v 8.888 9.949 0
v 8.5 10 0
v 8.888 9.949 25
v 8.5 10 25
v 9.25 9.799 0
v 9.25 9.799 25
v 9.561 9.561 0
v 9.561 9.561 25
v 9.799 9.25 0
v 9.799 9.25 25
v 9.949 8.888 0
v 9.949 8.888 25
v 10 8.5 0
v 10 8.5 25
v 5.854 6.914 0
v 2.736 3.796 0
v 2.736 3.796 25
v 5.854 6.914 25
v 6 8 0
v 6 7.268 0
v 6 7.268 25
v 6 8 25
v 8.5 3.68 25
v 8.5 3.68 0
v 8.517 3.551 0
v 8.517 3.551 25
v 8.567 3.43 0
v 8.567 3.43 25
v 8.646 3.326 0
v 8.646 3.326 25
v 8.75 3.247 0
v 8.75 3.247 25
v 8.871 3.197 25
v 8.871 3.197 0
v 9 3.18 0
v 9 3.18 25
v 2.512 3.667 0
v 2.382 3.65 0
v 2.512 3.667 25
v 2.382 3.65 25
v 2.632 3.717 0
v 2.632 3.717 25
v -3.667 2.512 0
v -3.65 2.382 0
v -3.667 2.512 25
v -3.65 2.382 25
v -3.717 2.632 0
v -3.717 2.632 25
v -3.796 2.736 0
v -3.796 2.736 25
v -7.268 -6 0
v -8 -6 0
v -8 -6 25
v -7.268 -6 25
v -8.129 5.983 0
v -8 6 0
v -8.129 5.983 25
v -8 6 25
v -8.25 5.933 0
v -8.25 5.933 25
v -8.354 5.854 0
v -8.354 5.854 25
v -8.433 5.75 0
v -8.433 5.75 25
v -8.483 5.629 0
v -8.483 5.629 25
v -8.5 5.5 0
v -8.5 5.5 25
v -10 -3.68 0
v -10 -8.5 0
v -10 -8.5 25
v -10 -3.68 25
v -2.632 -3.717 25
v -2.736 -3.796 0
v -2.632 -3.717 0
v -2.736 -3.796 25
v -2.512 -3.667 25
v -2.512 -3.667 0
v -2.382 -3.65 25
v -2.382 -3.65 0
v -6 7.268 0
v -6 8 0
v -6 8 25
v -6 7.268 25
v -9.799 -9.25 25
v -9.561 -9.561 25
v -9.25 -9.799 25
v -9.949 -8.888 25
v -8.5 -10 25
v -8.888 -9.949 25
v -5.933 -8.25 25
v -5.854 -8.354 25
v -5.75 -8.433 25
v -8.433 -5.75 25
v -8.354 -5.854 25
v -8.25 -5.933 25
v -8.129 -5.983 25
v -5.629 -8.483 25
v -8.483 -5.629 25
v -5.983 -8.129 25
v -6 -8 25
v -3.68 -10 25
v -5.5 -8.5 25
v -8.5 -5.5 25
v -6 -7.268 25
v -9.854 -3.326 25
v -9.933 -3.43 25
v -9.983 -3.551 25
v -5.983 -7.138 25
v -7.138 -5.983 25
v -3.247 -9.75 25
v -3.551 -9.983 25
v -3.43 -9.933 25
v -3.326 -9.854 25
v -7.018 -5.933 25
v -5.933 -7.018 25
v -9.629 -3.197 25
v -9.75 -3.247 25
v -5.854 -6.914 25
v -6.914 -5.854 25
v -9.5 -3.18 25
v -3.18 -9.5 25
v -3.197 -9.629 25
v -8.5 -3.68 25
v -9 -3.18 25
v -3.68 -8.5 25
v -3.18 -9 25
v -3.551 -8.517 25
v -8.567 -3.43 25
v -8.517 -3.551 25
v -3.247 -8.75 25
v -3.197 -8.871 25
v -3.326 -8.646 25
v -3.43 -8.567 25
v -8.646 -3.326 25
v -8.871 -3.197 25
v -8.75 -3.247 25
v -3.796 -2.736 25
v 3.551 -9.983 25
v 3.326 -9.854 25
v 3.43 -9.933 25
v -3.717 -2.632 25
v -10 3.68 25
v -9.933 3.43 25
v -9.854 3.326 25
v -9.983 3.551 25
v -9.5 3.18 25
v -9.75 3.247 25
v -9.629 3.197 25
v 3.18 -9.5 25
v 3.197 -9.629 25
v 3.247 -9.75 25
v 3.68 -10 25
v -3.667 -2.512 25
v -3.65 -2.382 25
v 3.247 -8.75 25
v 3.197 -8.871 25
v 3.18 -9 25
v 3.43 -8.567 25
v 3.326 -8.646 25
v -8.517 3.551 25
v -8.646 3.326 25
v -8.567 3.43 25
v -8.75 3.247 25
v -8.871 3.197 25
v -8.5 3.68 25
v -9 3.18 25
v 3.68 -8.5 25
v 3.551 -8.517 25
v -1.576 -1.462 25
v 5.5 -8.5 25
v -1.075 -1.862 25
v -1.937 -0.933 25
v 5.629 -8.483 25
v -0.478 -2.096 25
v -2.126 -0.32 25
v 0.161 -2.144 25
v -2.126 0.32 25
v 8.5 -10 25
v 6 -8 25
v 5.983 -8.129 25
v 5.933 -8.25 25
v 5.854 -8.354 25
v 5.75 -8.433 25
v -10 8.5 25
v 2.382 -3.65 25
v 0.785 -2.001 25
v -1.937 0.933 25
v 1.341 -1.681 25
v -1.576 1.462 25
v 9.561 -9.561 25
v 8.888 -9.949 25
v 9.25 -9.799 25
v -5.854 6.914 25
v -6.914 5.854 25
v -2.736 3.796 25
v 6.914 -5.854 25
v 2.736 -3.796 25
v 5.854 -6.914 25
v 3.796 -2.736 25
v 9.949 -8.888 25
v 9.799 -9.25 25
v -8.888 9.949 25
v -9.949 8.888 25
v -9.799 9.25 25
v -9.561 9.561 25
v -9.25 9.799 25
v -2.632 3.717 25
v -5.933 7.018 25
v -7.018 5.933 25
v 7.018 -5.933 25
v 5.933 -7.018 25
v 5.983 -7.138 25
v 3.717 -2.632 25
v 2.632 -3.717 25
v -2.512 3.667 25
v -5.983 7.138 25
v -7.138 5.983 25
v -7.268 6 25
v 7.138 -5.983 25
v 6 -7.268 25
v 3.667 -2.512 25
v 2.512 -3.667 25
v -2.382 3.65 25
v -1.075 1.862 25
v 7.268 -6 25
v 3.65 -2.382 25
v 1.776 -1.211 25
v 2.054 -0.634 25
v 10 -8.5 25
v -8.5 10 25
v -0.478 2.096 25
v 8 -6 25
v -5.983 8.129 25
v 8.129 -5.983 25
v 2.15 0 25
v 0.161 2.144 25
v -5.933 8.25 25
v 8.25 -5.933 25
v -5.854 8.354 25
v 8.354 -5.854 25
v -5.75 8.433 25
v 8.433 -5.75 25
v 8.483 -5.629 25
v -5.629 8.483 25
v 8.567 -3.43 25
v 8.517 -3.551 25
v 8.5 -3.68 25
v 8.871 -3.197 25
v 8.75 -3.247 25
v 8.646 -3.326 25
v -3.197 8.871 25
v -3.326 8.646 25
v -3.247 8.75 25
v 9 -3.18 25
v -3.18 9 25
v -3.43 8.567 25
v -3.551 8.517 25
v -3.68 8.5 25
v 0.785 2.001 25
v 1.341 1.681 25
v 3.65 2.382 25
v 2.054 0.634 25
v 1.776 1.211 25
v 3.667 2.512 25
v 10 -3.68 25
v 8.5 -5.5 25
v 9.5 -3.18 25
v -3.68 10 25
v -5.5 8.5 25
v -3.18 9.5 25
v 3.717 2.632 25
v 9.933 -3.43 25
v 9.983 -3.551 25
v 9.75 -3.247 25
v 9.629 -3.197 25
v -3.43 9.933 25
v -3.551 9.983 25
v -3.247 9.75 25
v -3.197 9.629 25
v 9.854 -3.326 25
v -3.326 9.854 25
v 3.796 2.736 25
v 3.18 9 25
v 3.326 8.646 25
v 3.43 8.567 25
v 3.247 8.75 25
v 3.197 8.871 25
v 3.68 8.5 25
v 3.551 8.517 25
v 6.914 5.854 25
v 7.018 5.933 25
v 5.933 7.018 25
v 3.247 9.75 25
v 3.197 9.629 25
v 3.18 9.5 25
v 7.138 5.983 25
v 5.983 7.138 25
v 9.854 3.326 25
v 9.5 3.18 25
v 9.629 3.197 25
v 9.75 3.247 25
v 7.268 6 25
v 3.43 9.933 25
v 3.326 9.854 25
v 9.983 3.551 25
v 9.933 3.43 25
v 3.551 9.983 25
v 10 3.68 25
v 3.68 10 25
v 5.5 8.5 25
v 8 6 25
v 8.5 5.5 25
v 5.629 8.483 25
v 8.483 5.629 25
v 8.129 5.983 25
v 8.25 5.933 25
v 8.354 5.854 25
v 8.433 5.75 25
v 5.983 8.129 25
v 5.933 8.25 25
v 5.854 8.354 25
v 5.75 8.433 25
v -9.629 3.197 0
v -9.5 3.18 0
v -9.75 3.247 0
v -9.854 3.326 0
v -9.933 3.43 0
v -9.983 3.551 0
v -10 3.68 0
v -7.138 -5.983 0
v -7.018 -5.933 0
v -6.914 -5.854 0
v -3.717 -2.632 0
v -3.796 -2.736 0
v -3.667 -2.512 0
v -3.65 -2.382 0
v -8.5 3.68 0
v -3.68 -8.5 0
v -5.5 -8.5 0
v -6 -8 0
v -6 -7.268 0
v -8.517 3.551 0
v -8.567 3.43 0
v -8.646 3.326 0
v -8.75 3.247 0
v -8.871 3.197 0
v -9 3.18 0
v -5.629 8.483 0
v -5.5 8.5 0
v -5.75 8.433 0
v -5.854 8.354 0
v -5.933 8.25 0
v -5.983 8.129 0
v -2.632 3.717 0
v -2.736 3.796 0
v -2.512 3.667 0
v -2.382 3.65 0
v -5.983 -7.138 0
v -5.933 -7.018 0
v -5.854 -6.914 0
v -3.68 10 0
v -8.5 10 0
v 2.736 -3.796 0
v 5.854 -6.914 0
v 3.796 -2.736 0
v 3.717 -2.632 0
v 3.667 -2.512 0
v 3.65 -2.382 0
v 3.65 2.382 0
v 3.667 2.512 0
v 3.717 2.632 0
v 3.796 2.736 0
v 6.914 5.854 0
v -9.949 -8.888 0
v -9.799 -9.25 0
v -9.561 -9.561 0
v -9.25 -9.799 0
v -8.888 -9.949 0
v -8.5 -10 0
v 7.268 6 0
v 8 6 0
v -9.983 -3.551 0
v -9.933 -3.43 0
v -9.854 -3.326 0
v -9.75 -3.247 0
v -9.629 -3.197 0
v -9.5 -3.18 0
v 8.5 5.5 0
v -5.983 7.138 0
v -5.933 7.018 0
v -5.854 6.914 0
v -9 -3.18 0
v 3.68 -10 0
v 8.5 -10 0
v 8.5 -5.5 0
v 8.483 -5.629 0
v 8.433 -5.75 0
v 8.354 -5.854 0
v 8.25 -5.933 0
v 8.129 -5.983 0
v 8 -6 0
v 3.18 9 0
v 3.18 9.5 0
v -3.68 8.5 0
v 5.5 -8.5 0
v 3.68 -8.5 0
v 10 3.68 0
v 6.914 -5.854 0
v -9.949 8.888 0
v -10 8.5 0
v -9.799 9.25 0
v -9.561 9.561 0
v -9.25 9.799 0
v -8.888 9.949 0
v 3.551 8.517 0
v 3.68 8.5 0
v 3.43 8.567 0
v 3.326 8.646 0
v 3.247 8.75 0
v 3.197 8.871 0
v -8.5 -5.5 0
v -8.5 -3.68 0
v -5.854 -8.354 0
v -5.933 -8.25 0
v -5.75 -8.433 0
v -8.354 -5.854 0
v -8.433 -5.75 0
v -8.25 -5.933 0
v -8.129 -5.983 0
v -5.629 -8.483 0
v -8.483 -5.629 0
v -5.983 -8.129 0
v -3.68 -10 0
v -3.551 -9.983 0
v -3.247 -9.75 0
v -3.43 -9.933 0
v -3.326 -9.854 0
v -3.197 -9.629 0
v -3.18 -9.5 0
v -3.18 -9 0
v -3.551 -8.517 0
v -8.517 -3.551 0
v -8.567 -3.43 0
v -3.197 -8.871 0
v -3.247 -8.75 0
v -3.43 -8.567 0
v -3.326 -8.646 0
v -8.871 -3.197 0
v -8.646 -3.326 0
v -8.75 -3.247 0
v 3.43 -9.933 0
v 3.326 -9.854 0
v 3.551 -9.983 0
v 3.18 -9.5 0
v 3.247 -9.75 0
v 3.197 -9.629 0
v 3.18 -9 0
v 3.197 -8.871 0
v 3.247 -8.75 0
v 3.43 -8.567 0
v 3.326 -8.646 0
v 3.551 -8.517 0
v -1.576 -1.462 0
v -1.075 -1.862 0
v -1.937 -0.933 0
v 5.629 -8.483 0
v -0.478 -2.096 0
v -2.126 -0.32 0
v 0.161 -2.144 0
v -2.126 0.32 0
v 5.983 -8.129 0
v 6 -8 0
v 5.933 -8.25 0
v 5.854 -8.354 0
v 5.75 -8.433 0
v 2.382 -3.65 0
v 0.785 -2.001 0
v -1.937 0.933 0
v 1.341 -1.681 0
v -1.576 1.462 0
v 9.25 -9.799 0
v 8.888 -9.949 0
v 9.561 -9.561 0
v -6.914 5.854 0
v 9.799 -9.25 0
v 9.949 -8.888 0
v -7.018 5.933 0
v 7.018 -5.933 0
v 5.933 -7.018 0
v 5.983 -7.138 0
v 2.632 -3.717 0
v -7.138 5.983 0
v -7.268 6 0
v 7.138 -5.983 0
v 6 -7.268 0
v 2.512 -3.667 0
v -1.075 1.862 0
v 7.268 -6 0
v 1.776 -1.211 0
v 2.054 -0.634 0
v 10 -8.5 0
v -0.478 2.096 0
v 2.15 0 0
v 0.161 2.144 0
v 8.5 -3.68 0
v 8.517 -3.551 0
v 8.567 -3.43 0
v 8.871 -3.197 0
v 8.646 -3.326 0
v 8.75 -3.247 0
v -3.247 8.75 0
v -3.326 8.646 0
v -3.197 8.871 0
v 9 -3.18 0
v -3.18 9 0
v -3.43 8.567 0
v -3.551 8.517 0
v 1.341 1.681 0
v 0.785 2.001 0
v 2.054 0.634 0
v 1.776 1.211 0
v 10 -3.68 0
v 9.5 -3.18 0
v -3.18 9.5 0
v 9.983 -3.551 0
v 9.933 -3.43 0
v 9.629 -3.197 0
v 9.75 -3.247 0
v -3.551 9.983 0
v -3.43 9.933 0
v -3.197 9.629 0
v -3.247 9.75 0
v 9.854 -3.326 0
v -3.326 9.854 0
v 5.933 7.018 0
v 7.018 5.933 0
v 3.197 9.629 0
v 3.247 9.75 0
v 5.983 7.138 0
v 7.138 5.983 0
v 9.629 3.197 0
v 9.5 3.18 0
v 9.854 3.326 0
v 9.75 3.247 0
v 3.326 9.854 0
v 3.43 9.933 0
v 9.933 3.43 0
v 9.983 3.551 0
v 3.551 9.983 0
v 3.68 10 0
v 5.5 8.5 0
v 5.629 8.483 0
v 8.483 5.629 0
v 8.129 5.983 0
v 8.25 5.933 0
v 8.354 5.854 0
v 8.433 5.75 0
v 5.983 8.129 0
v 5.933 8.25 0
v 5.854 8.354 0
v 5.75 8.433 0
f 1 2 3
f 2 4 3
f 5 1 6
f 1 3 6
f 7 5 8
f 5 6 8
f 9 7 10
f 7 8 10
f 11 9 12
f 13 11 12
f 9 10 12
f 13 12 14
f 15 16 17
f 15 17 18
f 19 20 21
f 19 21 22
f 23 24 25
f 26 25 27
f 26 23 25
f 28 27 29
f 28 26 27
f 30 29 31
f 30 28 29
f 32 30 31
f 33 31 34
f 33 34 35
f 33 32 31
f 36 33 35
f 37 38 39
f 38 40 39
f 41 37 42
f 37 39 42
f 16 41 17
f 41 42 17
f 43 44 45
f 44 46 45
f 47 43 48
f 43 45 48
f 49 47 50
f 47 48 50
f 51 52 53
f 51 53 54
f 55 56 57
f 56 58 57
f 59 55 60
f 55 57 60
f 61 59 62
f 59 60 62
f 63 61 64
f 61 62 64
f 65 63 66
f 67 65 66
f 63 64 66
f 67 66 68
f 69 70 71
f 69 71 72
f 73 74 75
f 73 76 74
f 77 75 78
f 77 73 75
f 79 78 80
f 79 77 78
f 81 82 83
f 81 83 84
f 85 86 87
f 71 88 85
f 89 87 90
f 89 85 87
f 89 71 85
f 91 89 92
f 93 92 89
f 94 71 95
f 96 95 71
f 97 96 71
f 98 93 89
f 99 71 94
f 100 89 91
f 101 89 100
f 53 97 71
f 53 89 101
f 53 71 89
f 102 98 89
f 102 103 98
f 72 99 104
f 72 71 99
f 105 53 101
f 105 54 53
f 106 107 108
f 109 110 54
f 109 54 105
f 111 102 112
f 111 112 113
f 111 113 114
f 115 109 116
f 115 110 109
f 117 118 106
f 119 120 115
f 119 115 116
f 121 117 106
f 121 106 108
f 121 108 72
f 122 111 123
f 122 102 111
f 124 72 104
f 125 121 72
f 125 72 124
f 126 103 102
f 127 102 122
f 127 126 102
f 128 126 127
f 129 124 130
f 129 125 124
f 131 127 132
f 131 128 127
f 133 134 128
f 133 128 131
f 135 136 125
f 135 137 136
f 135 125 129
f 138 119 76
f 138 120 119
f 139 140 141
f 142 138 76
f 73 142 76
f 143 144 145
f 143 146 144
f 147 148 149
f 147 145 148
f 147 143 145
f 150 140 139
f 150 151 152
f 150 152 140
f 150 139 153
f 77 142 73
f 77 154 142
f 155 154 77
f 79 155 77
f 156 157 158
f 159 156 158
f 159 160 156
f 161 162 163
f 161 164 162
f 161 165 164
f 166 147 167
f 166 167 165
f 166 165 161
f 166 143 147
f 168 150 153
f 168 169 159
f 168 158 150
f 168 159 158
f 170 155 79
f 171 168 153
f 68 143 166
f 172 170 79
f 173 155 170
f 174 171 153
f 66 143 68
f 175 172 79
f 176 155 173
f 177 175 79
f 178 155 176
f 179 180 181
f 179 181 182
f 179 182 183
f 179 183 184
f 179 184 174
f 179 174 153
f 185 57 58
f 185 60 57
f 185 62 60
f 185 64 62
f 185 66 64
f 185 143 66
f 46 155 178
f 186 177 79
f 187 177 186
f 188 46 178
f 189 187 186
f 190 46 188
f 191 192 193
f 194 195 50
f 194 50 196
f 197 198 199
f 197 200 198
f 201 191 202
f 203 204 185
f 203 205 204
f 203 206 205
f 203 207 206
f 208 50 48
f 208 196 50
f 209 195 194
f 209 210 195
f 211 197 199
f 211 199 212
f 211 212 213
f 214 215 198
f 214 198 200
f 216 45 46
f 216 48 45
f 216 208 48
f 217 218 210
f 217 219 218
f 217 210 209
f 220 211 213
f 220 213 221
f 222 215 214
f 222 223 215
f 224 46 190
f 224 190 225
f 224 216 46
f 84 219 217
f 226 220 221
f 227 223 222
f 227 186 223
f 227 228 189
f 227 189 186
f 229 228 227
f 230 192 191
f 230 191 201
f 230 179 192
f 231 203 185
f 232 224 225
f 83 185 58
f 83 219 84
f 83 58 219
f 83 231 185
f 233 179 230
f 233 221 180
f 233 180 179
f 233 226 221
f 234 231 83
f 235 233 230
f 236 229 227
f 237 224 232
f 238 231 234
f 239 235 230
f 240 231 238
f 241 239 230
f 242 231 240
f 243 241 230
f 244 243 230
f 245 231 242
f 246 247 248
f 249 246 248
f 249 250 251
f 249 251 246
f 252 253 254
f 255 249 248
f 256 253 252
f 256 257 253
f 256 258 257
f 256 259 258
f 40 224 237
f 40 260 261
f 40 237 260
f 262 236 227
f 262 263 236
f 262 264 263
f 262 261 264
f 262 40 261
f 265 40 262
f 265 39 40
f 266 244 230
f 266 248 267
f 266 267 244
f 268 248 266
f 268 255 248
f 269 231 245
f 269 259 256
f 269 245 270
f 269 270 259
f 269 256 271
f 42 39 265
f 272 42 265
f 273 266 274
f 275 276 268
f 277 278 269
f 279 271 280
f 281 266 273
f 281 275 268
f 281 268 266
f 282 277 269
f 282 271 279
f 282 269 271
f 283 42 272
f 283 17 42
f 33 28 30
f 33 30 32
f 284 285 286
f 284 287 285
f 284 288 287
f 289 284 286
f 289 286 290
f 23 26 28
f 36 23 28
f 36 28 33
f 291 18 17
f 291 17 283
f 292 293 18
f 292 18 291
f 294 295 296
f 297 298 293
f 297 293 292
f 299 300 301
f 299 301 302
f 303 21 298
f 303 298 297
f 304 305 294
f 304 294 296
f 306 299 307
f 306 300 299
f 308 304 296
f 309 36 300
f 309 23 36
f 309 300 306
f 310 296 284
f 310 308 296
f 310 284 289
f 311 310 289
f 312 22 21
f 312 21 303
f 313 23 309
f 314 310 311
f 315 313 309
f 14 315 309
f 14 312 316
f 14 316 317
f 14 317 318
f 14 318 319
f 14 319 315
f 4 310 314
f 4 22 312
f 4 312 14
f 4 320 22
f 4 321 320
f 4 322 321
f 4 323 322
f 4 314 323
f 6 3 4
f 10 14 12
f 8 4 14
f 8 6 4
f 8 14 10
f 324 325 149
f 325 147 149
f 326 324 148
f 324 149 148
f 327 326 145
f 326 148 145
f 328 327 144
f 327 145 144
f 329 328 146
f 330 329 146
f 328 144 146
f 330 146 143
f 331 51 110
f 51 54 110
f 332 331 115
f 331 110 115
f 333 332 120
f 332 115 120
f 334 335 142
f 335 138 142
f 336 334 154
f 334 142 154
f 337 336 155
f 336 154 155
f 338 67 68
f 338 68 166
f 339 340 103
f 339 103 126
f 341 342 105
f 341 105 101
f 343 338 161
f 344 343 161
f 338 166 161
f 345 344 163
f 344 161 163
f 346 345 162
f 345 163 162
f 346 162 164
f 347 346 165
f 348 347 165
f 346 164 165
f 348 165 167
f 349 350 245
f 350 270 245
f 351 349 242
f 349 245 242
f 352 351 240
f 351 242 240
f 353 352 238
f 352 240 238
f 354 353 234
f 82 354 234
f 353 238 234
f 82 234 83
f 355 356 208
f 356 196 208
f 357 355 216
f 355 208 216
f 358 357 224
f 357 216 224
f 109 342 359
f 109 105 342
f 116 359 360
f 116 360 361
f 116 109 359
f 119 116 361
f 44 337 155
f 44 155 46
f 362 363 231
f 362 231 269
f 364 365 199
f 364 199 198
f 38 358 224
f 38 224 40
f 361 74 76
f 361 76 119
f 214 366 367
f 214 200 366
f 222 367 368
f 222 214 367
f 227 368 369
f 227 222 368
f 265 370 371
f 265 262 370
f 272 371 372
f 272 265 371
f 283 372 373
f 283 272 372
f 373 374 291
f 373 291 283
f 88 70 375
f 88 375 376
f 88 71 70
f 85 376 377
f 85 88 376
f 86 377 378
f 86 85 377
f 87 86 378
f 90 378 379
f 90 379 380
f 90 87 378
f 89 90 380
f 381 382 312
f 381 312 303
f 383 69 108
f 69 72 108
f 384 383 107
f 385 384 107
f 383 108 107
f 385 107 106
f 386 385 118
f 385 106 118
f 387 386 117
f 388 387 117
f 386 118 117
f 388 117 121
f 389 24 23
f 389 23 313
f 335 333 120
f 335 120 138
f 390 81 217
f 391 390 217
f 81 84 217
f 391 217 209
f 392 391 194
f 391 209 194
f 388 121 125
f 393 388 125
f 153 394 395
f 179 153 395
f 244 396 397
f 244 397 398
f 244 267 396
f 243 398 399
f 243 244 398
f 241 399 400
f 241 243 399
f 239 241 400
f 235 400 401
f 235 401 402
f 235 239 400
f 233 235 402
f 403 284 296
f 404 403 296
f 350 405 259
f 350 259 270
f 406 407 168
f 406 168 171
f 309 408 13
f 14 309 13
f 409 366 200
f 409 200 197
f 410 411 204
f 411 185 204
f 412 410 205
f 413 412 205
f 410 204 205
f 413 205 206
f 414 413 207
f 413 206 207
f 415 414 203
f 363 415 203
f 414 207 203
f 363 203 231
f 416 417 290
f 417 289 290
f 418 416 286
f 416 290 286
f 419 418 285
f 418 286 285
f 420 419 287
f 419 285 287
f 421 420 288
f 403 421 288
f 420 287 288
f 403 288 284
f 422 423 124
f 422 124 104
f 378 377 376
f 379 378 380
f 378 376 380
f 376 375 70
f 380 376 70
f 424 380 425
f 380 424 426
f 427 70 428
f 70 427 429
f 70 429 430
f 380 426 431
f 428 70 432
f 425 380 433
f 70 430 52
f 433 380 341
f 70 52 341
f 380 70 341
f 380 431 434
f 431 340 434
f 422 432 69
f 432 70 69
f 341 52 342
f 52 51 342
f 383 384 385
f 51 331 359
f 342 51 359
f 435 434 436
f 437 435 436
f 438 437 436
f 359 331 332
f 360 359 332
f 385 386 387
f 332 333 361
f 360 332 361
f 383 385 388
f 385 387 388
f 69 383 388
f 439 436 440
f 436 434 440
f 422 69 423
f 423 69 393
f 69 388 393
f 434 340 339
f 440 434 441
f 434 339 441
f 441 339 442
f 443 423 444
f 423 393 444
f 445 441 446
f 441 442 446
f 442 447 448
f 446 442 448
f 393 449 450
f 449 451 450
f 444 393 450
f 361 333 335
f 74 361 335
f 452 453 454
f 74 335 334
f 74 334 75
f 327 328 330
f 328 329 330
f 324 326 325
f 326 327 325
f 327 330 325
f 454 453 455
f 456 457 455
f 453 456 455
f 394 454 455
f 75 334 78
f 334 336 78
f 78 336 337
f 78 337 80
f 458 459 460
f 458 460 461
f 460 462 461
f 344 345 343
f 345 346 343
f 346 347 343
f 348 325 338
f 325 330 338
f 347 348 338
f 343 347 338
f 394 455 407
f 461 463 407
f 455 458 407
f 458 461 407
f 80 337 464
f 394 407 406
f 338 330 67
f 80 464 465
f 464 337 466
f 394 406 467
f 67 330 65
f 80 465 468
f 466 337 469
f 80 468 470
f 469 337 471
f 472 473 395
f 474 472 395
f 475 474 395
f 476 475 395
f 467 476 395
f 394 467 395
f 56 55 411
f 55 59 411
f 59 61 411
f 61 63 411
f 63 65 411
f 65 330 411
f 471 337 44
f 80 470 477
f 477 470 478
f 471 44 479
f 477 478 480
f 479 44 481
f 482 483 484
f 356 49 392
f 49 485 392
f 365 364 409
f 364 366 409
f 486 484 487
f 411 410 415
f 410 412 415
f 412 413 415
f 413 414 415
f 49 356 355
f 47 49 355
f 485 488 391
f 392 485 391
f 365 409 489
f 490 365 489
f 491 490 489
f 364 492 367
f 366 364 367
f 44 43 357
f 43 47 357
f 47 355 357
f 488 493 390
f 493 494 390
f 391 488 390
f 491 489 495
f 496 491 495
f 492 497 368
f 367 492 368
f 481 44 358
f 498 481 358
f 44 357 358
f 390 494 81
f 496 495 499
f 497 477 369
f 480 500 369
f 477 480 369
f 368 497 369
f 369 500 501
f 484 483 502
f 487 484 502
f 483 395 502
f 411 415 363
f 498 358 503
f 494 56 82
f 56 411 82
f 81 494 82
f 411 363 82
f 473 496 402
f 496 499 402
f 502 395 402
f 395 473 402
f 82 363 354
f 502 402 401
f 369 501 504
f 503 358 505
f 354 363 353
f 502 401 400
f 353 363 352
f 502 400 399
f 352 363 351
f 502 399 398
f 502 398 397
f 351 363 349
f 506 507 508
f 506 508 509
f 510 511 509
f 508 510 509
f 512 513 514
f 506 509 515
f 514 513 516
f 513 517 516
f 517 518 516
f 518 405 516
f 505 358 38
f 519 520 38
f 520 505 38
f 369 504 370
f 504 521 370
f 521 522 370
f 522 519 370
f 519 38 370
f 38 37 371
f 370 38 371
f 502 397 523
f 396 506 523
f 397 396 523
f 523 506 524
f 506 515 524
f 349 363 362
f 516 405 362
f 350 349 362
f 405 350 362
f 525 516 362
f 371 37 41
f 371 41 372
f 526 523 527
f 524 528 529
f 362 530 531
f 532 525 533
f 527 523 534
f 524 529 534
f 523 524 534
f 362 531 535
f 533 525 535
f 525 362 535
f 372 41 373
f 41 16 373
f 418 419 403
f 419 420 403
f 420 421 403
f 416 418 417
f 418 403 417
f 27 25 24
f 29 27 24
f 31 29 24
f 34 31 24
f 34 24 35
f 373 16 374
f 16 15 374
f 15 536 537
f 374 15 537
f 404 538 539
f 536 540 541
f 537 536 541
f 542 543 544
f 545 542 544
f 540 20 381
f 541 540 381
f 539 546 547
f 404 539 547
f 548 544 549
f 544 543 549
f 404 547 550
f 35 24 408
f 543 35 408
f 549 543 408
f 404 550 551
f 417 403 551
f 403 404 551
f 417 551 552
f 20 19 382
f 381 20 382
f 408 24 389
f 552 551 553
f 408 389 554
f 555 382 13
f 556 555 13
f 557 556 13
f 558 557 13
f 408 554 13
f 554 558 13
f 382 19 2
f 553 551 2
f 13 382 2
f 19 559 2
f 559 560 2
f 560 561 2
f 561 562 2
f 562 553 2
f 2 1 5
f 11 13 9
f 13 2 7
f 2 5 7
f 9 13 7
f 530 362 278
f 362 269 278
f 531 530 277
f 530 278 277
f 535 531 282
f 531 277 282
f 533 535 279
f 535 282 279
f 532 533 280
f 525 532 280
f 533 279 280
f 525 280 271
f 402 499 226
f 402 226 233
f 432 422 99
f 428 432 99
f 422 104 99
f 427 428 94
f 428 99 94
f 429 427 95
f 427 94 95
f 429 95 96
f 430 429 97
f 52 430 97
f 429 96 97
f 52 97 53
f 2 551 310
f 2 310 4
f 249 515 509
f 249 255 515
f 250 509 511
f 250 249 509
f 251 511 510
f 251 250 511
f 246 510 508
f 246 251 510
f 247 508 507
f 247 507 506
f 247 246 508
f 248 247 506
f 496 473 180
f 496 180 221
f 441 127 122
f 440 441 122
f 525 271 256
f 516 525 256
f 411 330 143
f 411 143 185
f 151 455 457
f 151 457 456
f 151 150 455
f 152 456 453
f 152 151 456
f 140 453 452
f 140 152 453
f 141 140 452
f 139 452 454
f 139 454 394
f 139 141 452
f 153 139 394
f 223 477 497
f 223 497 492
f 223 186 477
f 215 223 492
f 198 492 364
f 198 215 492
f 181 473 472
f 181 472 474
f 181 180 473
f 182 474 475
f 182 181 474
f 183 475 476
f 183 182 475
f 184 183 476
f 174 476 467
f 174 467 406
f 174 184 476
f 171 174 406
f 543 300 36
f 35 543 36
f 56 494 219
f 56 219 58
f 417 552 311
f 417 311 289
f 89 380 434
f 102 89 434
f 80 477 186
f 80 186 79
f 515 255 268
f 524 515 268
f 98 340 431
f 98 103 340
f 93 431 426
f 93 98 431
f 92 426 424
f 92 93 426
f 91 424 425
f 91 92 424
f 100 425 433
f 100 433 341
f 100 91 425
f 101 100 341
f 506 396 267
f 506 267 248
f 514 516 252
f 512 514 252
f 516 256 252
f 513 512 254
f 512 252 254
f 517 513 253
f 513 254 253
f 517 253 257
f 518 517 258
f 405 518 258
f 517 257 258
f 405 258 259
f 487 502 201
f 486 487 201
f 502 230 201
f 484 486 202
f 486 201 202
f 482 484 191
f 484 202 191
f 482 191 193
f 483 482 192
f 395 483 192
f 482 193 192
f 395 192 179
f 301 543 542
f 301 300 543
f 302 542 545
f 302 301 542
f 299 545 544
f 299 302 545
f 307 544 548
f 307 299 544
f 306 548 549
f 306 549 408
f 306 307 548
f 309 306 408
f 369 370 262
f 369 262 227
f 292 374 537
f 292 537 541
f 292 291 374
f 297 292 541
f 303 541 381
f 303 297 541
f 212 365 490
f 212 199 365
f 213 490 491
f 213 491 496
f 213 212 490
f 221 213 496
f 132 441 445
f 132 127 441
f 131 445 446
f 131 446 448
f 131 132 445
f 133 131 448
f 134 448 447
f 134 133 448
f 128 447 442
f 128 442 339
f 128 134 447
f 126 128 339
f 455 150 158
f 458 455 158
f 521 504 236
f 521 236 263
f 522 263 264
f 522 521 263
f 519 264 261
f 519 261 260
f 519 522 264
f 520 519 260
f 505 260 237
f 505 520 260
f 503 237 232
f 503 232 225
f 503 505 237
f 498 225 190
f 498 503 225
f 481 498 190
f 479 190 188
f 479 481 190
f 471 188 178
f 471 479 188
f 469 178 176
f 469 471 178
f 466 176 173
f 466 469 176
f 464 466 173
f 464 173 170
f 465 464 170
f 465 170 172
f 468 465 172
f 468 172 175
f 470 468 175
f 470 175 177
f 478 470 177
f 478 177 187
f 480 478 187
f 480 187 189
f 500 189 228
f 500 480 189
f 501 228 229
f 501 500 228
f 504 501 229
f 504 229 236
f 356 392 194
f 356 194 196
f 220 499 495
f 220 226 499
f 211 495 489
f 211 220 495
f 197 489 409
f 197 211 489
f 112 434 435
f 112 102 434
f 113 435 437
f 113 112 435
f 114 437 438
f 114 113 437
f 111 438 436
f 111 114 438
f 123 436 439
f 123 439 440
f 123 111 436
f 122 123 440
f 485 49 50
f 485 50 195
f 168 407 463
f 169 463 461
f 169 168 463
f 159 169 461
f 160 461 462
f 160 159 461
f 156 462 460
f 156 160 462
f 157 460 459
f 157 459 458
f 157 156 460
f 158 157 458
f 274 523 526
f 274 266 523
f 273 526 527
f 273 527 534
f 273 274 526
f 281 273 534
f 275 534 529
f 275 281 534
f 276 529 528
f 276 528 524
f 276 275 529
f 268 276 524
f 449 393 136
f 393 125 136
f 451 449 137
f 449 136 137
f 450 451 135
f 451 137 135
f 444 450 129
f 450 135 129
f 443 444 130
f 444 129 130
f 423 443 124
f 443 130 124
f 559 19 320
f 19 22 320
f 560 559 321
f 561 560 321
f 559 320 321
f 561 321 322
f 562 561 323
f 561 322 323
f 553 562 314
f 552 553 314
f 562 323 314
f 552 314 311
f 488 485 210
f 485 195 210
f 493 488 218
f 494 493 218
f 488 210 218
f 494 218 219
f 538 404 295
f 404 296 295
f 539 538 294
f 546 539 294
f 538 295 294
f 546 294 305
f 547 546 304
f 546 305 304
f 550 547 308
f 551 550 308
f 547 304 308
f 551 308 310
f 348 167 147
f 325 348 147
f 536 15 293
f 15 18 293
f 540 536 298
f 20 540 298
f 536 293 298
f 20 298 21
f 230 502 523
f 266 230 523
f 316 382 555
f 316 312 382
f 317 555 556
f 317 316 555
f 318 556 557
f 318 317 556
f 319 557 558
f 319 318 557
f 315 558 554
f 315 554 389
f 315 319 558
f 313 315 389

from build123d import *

# Parameters (mm, degrees)
F0_W     = 20
F0_H     = 20
F0_R     = 2.15
F2_DEPTH = 25
F3_DEPTH = 25.001
F4_R     = 1.5
F5_R     = 0.5


with BuildPart() as f2:
    # F0 (on Top) → F2 (new body)
    with BuildSketch(Plane.XY):
        Rectangle(F0_W, F0_H)
        Circle(F0_R, mode=Mode.SUBTRACT)
    extrude(amount=F2_DEPTH)

    # F1 (on face) → F3 (cut, through all)
    with BuildSketch(Plane.XY):
        Polygon((-8.5, 3.18), (-10, 3.18), (-10, -3.18), (-8.5, -3.18), (-8.5, -6), (-7.06066, -6), (-3.65, -2.58934), (-3.65, 2.58934), (-7.06066, 6), (-8.5, 6), align=None)
        Polygon((-3.18, -8.5), (-3.18, -10), (3.18, -10), (3.18, -8.5), (6, -8.5), (6, -7.06066), (2.58934, -3.65), (-2.58934, -3.65), (-6, -7.06066), (-6, -8.5), align=None)
        Polygon((10, -3.18), (10, 3.18), (8.5, 3.18), (8.5, 6), (7.06066, 6), (3.65, 2.58934), (3.65, -2.58934), (7.06066, -6), (8.5, -6), (8.5, -3.18), align=None)
        Polygon((3.18, 10), (-3.18, 10), (-3.18, 8.5), (-6, 8.5), (-6, 7.06066), (-2.58934, 3.65), (2.58934, 3.65), (6, 7.06066), (6, 8.5), (3.18, 8.5), align=None)
    extrude(amount=F3_DEPTH, mode=Mode.SUBTRACT)

    # F4
    f4_edges = [f2.edges().sort_by_distance(p)[0] for p in [
        (10, -10, 12.5),
        (-10, -10, 12.5),
        (10, 10, 12.5),
        (-10, 10, 12.5),
    ]]
    fillet(f4_edges, radius=F4_R)

    # F5
    f5_edges = [f2.edges().sort_by_distance(p)[0] for p in [
        (-3.18, -10, 12.5),
        (-10, 3.18, 12.5),
        (-3.18, 10, 12.5),
        (3.18, -10, 12.5),
        (10, 3.18, 12.5),
        (10, -3.18, 12.5),
        (-10, -3.18, 12.5),
        (3.18, 10, 12.5),
        (-6, -8.5, 12.5),
        (-3.18, -8.5, 12.5),
        (3.18, -8.5, 12.5),
        (-8.5, 3.18, 12.5),
        (-8.5, -3.18, 12.5),
        (8.5, -3.18, 12.5),
        (8.5, 3.18, 12.5),
        (3.18, 8.5, 12.5),
        (6, 8.5, 12.5),
        (8.5, 6, 12.5),
        (7.06066, 6, 12.5),
        (6, 7.06066, 12.5),
        (-2.58934, -3.65, 12.5),
        (2.58934, -3.65, 12.5),
        (3.65, 2.58934, 12.5),
        (3.65, -2.58934, 12.5),
        (-3.65, -2.58934, 12.5),
        (-3.65, 2.58934, 12.5),
        (2.58934, 3.65, 12.5),
        (-2.58934, 3.65, 12.5),
        (-6, 8.5, 12.5),
        (-6, 7.06066, 12.5),
        (-3.18, 8.5, 12.5),
        (8.5, -6, 12.5),
        (7.06066, -6, 12.5),
        (-8.5, -6, 12.5),
        (-7.06066, -6, 12.5),
        (-6, -7.06066, 12.5),
        (6, -7.06066, 12.5),
        (6, -8.5, 12.5),
        (-8.5, 6, 12.5),
        (-7.06066, 6, 12.5),
    ]]
    fillet(f5_edges, radius=F5_R)


solid = f2.part
